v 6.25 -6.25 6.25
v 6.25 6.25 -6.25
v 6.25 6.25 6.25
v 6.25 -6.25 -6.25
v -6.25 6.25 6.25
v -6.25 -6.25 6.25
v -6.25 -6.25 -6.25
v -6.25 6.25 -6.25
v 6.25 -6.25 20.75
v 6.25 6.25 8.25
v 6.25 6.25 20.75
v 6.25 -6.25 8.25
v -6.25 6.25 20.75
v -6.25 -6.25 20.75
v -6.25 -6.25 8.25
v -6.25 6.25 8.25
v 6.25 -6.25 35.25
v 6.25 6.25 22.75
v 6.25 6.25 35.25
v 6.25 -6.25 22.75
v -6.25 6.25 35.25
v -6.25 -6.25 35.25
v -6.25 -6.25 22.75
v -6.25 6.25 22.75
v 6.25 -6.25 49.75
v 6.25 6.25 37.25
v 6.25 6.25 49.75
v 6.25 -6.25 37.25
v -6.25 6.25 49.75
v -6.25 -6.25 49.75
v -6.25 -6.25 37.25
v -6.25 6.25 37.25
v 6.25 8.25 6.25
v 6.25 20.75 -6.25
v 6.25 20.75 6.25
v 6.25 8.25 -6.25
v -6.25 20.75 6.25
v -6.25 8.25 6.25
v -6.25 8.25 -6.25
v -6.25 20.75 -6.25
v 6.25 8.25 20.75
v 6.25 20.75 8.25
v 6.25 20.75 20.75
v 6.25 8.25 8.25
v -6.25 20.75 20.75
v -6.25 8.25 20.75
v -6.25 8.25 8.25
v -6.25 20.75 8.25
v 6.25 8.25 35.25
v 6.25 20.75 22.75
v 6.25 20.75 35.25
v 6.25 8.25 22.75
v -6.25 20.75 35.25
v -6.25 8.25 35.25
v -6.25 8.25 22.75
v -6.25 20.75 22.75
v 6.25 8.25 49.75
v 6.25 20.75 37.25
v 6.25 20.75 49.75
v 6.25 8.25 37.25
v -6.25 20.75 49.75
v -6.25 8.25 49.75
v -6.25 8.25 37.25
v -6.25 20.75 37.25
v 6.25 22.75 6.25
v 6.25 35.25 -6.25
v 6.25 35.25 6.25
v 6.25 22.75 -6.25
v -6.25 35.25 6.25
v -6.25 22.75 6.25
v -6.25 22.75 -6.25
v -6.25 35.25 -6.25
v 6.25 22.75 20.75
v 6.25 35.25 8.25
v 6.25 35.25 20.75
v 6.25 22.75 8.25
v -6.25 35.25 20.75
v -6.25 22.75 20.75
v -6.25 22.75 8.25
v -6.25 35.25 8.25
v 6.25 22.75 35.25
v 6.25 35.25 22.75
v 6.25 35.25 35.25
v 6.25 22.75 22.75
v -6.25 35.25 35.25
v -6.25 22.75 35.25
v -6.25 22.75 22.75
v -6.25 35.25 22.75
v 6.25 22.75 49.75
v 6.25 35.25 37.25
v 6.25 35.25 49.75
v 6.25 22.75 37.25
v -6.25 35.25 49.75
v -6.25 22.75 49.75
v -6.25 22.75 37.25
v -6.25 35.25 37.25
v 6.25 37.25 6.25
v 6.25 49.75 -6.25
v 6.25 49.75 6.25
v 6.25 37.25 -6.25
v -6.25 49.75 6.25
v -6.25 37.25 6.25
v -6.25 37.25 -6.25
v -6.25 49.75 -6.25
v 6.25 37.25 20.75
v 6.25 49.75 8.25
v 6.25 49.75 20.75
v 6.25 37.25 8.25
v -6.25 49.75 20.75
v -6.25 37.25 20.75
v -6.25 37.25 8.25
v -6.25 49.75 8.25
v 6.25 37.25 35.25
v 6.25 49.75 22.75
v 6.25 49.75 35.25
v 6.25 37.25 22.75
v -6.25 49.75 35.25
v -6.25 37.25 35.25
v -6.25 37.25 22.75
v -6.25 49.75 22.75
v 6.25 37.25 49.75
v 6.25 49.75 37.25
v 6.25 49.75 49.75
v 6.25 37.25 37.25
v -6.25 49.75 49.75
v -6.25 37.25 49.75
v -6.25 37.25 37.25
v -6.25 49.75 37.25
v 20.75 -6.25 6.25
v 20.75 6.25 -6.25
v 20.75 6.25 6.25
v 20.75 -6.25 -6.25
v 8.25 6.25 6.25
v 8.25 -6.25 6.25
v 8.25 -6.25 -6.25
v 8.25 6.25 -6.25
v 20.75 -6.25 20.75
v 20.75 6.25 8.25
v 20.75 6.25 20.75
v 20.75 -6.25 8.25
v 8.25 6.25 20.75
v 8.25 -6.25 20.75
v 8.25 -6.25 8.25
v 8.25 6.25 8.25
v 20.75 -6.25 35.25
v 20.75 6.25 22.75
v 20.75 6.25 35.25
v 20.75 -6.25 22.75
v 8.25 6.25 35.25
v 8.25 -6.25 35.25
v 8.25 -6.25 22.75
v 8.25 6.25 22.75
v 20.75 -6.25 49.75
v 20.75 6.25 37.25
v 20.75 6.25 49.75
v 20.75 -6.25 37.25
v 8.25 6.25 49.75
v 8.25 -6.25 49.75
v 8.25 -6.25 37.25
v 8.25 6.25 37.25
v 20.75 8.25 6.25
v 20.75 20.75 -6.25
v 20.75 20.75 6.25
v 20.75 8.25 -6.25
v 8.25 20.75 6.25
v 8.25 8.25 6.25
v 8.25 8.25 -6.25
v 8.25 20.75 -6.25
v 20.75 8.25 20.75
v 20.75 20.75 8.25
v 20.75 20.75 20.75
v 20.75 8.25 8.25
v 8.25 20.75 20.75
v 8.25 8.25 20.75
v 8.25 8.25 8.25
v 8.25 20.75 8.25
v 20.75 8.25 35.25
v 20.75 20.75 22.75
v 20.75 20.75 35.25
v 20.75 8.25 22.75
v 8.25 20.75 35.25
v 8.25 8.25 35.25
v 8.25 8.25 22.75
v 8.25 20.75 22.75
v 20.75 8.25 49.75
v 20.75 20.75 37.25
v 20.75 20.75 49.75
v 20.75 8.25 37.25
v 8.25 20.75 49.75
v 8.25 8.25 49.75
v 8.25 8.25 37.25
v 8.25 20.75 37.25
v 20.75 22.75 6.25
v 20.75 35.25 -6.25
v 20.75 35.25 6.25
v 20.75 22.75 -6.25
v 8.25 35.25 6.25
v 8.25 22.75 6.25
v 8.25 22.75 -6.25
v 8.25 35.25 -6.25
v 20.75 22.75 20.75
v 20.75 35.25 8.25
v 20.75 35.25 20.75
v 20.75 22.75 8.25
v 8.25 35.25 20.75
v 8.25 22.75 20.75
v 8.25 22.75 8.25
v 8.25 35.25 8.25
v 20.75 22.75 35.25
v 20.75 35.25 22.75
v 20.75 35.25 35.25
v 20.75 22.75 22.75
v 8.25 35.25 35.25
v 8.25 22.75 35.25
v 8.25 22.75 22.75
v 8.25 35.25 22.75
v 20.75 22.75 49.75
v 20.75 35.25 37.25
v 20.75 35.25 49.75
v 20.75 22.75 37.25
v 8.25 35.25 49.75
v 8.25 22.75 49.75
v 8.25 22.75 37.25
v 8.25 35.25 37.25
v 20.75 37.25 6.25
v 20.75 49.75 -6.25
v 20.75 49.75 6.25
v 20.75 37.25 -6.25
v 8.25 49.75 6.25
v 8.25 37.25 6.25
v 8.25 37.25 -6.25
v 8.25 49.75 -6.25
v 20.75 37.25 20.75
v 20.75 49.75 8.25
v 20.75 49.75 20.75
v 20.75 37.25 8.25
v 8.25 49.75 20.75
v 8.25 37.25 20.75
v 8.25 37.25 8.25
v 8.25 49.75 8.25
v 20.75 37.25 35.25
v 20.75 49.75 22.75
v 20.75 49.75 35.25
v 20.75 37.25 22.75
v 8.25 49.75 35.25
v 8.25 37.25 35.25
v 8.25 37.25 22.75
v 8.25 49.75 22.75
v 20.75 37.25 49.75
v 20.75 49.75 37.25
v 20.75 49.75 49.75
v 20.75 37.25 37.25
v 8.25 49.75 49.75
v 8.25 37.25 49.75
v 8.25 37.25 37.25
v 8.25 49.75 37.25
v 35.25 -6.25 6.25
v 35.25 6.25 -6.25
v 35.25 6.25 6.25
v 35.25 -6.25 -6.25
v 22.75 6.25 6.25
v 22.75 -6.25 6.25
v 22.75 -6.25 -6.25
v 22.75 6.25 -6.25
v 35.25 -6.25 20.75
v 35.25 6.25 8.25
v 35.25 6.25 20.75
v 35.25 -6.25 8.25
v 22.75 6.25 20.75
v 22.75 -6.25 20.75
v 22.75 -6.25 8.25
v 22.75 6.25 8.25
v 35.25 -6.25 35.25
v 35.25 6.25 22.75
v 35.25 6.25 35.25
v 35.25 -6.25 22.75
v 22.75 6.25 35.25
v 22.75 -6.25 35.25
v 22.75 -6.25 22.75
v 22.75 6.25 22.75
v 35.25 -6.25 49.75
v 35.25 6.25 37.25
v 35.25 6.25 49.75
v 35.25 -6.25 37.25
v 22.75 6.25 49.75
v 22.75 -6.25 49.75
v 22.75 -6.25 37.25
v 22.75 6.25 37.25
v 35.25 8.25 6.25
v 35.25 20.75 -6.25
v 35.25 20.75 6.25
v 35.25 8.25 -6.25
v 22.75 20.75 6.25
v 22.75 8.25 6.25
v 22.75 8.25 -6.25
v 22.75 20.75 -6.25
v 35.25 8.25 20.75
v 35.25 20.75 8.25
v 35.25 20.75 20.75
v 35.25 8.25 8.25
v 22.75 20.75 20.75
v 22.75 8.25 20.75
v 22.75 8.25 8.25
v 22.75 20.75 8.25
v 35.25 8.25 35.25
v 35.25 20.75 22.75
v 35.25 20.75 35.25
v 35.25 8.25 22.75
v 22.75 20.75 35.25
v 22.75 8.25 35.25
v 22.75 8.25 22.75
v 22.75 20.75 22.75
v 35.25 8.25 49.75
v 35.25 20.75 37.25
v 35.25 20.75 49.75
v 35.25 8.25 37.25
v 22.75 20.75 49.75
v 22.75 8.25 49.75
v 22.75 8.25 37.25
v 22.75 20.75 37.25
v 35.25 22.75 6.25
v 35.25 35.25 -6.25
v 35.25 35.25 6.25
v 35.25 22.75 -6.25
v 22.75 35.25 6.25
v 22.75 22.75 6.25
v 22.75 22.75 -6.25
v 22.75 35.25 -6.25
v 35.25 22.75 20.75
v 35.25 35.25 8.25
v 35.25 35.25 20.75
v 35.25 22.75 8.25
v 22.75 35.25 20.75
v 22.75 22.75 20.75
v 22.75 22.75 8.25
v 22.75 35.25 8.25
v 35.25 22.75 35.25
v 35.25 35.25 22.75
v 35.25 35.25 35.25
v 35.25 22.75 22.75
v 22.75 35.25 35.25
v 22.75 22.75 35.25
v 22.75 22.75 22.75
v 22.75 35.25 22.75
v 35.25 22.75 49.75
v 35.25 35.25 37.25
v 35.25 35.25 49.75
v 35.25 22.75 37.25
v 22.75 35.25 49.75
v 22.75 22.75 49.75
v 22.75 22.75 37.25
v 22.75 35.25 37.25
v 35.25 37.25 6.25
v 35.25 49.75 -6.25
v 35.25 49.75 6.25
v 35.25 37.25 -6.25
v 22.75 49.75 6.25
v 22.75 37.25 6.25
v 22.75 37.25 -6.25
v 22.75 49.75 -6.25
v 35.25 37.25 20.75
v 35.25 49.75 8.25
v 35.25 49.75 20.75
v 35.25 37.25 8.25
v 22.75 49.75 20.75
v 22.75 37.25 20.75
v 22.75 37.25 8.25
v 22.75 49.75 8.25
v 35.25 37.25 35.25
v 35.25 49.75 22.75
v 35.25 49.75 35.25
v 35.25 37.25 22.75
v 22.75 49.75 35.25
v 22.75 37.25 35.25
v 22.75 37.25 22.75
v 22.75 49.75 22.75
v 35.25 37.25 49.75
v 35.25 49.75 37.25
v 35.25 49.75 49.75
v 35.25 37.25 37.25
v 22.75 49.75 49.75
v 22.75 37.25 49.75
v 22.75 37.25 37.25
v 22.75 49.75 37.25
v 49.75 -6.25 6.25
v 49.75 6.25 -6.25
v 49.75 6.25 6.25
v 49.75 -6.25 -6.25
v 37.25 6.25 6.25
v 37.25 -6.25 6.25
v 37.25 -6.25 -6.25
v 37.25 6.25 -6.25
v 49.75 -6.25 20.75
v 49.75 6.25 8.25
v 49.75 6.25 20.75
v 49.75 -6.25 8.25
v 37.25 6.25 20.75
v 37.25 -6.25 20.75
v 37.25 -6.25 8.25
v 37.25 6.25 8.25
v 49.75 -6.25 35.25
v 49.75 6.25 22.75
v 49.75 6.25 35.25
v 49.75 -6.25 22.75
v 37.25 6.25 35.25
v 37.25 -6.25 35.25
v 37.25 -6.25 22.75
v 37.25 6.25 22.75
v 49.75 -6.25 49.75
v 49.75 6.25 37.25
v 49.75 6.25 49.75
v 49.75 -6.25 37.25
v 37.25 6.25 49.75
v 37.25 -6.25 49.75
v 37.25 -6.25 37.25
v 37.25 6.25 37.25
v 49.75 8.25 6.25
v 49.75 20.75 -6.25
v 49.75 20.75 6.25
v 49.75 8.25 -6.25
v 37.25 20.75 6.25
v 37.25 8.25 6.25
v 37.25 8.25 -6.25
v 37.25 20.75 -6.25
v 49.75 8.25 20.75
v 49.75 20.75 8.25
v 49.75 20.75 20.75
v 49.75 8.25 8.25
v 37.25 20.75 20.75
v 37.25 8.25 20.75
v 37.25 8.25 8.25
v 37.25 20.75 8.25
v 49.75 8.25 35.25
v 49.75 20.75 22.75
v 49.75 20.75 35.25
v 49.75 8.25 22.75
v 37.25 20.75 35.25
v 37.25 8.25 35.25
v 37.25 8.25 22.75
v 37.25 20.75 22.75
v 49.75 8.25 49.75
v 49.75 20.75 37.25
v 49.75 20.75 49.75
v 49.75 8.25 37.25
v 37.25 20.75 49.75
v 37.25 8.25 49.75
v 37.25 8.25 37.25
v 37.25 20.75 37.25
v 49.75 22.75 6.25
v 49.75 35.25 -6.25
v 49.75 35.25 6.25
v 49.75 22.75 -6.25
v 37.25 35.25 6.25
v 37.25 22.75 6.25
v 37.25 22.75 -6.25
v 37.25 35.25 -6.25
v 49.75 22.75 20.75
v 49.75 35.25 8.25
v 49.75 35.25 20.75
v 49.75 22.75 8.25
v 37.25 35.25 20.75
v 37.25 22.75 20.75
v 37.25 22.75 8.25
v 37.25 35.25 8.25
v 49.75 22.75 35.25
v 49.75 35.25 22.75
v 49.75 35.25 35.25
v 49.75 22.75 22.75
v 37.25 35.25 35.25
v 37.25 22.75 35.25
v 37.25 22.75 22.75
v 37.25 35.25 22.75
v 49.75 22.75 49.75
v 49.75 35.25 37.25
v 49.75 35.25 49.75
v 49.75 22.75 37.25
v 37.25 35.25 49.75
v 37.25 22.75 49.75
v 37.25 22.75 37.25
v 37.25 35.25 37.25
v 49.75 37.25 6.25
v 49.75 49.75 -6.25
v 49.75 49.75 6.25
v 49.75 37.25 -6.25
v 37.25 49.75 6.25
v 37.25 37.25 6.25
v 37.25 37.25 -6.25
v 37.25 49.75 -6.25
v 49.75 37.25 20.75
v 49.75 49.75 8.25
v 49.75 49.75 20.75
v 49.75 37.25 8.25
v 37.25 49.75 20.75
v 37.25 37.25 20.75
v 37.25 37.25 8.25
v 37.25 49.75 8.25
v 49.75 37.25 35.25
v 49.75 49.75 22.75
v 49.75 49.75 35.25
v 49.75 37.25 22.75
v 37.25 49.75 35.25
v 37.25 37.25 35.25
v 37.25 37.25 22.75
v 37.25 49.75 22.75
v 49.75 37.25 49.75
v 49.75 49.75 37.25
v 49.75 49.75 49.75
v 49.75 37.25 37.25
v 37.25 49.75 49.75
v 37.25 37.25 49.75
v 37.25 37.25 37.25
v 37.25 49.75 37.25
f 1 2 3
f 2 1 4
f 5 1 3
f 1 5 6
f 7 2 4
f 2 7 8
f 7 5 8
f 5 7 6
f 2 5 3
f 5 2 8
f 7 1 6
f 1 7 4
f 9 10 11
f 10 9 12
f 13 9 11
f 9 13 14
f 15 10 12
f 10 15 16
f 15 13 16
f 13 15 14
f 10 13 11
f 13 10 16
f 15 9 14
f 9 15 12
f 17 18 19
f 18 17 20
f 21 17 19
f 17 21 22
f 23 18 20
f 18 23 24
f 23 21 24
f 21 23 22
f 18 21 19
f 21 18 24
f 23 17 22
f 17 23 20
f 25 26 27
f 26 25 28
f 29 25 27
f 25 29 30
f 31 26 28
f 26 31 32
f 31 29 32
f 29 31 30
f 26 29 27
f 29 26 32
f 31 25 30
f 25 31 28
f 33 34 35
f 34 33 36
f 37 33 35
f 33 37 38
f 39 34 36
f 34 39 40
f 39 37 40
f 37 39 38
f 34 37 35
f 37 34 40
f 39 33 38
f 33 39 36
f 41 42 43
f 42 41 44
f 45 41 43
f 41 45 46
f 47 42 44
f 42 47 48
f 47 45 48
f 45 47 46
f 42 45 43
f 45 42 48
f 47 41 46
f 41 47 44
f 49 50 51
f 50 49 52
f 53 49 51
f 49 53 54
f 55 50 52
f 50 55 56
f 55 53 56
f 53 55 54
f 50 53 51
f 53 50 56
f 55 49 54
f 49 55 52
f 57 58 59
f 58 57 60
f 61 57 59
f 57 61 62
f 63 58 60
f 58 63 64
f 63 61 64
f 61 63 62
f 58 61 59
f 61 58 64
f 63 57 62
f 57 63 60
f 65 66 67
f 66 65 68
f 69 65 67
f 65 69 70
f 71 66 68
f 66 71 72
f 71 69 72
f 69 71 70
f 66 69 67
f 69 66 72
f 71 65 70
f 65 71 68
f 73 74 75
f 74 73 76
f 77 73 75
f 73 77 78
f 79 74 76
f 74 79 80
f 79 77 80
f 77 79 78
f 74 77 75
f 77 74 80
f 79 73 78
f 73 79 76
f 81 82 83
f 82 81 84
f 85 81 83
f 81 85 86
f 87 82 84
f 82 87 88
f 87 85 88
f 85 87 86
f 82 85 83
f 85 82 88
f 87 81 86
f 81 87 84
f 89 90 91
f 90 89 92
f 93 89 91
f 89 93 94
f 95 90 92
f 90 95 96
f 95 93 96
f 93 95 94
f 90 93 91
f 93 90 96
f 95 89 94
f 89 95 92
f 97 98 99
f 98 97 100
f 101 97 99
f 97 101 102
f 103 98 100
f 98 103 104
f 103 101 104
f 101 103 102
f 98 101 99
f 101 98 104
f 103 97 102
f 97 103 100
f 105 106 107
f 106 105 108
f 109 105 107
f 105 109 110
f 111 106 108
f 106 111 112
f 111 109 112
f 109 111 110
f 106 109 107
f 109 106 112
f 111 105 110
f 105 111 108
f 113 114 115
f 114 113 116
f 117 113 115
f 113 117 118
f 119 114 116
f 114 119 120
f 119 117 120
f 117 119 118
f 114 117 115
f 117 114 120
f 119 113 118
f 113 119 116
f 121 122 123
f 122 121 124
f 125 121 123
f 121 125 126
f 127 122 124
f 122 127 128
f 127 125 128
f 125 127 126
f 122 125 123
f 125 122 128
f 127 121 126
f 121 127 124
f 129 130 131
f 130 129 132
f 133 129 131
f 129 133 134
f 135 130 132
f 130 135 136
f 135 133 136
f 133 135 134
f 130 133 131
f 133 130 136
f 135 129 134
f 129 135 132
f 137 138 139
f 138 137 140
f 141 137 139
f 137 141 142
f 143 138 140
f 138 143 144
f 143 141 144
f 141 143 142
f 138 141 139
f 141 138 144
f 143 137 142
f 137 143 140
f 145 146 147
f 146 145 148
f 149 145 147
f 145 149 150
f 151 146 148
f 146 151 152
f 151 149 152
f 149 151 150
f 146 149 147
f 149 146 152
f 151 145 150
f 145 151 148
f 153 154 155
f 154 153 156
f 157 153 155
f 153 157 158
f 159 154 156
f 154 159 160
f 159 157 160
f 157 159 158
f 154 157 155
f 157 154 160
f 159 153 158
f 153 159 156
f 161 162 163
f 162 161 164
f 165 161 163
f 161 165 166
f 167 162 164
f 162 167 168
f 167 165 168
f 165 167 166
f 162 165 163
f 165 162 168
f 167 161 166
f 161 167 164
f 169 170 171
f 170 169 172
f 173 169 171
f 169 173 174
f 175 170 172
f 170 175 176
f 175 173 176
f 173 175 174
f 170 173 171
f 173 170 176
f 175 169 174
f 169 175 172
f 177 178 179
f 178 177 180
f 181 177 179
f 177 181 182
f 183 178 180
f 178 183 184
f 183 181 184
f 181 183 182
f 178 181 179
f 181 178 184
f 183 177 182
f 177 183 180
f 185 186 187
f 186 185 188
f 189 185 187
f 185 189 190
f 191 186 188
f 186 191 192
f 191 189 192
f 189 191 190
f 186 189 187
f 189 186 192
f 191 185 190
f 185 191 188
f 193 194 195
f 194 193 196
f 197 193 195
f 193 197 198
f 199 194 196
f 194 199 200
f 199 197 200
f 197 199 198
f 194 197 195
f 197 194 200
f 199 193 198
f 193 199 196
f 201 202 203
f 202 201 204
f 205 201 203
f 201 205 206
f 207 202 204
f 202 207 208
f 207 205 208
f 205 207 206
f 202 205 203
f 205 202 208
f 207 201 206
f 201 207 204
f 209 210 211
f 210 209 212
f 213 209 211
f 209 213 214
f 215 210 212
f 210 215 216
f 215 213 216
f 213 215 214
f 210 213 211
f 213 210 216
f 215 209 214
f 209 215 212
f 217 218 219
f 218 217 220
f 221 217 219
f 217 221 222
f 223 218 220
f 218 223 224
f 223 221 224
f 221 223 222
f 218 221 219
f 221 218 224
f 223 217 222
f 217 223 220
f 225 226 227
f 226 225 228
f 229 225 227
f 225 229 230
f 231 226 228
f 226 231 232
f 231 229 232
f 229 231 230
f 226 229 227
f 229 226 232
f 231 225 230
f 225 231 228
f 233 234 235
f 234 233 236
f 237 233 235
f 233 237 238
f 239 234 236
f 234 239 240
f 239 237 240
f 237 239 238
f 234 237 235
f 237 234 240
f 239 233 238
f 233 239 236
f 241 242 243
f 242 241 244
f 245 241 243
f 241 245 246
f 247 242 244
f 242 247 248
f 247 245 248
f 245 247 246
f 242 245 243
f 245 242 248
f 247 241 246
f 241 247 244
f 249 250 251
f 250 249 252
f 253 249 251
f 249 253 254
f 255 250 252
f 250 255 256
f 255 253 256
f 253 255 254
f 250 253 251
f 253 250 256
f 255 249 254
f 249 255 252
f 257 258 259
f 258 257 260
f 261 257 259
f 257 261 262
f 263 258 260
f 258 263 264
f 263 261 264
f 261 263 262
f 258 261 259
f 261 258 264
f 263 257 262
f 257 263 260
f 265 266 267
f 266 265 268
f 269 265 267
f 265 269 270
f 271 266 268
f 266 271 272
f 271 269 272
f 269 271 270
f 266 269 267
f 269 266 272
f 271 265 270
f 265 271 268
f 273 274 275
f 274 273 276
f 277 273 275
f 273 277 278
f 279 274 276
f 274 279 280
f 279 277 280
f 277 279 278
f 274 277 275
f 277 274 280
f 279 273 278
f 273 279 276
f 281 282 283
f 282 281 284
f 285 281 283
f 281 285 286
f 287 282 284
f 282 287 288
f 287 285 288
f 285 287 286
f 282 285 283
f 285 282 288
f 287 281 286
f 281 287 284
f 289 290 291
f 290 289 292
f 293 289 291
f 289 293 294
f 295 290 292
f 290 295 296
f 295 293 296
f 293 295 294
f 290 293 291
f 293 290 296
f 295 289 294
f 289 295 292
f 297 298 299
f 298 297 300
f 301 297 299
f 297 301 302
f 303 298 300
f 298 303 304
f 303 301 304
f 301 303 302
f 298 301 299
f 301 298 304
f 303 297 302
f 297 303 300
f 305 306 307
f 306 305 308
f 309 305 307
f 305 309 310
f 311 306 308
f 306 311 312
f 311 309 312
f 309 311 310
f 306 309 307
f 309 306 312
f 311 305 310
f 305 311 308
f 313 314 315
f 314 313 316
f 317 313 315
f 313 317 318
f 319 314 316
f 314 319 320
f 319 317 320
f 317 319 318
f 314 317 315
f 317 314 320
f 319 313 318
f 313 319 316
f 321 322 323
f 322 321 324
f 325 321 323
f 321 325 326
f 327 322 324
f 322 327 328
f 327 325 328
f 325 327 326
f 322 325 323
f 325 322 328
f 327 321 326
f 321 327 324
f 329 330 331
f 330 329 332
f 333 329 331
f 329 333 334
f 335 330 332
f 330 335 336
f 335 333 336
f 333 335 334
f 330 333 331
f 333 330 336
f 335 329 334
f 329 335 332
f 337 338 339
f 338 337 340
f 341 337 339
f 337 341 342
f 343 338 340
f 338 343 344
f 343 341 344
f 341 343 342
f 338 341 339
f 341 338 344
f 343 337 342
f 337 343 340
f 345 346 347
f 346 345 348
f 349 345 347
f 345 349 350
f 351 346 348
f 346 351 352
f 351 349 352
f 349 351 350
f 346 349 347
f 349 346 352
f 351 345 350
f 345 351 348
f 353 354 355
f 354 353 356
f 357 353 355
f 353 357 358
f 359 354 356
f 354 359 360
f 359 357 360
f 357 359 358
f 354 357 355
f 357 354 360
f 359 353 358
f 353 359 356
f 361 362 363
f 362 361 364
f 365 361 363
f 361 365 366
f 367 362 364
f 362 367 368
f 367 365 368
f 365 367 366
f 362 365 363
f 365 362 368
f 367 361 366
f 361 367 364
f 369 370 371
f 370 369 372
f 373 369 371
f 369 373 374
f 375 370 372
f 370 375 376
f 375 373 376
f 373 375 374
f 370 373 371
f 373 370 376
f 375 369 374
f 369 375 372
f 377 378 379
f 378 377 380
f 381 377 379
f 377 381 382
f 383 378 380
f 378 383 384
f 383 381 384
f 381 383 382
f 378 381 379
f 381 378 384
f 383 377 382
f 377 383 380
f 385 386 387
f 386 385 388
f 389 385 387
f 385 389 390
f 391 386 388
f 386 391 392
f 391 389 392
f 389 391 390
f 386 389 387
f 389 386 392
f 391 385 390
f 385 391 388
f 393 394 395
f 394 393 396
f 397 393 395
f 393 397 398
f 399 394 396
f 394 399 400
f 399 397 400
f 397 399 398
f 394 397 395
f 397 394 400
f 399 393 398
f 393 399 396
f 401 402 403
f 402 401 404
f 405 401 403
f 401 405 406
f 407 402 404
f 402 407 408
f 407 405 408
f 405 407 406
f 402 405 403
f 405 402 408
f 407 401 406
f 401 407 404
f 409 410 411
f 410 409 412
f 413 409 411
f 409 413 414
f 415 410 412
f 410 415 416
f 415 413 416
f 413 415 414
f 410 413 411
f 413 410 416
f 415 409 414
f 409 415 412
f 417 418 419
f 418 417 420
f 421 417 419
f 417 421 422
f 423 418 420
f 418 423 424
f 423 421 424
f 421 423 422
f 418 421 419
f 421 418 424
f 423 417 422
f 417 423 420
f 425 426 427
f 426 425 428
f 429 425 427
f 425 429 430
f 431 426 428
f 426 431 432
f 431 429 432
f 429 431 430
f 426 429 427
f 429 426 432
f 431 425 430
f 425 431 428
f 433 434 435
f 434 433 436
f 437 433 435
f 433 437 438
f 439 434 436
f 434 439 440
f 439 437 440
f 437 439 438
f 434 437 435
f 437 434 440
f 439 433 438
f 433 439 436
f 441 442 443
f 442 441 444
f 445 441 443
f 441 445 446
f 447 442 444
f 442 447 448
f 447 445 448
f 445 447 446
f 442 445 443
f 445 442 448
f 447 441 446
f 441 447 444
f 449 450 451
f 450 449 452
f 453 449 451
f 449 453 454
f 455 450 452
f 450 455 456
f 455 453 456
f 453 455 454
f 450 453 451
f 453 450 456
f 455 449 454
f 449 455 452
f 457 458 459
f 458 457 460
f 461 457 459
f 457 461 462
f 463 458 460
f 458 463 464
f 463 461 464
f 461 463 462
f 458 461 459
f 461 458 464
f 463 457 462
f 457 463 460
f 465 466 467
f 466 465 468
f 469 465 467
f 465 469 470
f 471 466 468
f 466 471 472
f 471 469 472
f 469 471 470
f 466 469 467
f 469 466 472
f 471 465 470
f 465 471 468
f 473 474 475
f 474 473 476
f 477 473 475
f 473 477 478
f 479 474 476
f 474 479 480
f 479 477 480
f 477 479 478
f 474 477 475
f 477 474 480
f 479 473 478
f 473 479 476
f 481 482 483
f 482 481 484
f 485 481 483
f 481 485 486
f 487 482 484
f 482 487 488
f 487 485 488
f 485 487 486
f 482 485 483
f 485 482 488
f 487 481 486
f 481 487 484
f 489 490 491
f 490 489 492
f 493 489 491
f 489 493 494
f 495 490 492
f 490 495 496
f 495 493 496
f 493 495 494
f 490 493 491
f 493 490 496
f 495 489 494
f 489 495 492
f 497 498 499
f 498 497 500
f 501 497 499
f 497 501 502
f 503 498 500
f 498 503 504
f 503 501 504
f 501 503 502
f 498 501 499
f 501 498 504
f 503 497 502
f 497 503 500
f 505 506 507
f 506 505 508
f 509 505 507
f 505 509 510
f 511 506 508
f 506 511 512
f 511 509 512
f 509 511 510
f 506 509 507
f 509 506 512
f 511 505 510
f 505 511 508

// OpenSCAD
lonX=60;
lonY=60;
lonZ=60;
espesor=2;
//cube([lonX,lonY,lonZ],center=true);


divisiones=4;

menX=(lonX-(2*espesor)-(espesor*(divisiones-1)))/divisiones;
menY=(lonY-(2*espesor)-(espesor*(divisiones-1)))/divisiones;
menZ=(lonZ-(2*espesor)-(espesor*(divisiones-1)))/divisiones;

translate([])
for(i=[0:divisiones-1]){
    for(j=[0:divisiones-1]){
        for(k=[0:divisiones-1]){
            translate([(menX+espesor)*i,(menY+espesor)*j,(menZ+espesor)*k])
            cube([menX,menY,menZ],center=true);
        }
    }
}
